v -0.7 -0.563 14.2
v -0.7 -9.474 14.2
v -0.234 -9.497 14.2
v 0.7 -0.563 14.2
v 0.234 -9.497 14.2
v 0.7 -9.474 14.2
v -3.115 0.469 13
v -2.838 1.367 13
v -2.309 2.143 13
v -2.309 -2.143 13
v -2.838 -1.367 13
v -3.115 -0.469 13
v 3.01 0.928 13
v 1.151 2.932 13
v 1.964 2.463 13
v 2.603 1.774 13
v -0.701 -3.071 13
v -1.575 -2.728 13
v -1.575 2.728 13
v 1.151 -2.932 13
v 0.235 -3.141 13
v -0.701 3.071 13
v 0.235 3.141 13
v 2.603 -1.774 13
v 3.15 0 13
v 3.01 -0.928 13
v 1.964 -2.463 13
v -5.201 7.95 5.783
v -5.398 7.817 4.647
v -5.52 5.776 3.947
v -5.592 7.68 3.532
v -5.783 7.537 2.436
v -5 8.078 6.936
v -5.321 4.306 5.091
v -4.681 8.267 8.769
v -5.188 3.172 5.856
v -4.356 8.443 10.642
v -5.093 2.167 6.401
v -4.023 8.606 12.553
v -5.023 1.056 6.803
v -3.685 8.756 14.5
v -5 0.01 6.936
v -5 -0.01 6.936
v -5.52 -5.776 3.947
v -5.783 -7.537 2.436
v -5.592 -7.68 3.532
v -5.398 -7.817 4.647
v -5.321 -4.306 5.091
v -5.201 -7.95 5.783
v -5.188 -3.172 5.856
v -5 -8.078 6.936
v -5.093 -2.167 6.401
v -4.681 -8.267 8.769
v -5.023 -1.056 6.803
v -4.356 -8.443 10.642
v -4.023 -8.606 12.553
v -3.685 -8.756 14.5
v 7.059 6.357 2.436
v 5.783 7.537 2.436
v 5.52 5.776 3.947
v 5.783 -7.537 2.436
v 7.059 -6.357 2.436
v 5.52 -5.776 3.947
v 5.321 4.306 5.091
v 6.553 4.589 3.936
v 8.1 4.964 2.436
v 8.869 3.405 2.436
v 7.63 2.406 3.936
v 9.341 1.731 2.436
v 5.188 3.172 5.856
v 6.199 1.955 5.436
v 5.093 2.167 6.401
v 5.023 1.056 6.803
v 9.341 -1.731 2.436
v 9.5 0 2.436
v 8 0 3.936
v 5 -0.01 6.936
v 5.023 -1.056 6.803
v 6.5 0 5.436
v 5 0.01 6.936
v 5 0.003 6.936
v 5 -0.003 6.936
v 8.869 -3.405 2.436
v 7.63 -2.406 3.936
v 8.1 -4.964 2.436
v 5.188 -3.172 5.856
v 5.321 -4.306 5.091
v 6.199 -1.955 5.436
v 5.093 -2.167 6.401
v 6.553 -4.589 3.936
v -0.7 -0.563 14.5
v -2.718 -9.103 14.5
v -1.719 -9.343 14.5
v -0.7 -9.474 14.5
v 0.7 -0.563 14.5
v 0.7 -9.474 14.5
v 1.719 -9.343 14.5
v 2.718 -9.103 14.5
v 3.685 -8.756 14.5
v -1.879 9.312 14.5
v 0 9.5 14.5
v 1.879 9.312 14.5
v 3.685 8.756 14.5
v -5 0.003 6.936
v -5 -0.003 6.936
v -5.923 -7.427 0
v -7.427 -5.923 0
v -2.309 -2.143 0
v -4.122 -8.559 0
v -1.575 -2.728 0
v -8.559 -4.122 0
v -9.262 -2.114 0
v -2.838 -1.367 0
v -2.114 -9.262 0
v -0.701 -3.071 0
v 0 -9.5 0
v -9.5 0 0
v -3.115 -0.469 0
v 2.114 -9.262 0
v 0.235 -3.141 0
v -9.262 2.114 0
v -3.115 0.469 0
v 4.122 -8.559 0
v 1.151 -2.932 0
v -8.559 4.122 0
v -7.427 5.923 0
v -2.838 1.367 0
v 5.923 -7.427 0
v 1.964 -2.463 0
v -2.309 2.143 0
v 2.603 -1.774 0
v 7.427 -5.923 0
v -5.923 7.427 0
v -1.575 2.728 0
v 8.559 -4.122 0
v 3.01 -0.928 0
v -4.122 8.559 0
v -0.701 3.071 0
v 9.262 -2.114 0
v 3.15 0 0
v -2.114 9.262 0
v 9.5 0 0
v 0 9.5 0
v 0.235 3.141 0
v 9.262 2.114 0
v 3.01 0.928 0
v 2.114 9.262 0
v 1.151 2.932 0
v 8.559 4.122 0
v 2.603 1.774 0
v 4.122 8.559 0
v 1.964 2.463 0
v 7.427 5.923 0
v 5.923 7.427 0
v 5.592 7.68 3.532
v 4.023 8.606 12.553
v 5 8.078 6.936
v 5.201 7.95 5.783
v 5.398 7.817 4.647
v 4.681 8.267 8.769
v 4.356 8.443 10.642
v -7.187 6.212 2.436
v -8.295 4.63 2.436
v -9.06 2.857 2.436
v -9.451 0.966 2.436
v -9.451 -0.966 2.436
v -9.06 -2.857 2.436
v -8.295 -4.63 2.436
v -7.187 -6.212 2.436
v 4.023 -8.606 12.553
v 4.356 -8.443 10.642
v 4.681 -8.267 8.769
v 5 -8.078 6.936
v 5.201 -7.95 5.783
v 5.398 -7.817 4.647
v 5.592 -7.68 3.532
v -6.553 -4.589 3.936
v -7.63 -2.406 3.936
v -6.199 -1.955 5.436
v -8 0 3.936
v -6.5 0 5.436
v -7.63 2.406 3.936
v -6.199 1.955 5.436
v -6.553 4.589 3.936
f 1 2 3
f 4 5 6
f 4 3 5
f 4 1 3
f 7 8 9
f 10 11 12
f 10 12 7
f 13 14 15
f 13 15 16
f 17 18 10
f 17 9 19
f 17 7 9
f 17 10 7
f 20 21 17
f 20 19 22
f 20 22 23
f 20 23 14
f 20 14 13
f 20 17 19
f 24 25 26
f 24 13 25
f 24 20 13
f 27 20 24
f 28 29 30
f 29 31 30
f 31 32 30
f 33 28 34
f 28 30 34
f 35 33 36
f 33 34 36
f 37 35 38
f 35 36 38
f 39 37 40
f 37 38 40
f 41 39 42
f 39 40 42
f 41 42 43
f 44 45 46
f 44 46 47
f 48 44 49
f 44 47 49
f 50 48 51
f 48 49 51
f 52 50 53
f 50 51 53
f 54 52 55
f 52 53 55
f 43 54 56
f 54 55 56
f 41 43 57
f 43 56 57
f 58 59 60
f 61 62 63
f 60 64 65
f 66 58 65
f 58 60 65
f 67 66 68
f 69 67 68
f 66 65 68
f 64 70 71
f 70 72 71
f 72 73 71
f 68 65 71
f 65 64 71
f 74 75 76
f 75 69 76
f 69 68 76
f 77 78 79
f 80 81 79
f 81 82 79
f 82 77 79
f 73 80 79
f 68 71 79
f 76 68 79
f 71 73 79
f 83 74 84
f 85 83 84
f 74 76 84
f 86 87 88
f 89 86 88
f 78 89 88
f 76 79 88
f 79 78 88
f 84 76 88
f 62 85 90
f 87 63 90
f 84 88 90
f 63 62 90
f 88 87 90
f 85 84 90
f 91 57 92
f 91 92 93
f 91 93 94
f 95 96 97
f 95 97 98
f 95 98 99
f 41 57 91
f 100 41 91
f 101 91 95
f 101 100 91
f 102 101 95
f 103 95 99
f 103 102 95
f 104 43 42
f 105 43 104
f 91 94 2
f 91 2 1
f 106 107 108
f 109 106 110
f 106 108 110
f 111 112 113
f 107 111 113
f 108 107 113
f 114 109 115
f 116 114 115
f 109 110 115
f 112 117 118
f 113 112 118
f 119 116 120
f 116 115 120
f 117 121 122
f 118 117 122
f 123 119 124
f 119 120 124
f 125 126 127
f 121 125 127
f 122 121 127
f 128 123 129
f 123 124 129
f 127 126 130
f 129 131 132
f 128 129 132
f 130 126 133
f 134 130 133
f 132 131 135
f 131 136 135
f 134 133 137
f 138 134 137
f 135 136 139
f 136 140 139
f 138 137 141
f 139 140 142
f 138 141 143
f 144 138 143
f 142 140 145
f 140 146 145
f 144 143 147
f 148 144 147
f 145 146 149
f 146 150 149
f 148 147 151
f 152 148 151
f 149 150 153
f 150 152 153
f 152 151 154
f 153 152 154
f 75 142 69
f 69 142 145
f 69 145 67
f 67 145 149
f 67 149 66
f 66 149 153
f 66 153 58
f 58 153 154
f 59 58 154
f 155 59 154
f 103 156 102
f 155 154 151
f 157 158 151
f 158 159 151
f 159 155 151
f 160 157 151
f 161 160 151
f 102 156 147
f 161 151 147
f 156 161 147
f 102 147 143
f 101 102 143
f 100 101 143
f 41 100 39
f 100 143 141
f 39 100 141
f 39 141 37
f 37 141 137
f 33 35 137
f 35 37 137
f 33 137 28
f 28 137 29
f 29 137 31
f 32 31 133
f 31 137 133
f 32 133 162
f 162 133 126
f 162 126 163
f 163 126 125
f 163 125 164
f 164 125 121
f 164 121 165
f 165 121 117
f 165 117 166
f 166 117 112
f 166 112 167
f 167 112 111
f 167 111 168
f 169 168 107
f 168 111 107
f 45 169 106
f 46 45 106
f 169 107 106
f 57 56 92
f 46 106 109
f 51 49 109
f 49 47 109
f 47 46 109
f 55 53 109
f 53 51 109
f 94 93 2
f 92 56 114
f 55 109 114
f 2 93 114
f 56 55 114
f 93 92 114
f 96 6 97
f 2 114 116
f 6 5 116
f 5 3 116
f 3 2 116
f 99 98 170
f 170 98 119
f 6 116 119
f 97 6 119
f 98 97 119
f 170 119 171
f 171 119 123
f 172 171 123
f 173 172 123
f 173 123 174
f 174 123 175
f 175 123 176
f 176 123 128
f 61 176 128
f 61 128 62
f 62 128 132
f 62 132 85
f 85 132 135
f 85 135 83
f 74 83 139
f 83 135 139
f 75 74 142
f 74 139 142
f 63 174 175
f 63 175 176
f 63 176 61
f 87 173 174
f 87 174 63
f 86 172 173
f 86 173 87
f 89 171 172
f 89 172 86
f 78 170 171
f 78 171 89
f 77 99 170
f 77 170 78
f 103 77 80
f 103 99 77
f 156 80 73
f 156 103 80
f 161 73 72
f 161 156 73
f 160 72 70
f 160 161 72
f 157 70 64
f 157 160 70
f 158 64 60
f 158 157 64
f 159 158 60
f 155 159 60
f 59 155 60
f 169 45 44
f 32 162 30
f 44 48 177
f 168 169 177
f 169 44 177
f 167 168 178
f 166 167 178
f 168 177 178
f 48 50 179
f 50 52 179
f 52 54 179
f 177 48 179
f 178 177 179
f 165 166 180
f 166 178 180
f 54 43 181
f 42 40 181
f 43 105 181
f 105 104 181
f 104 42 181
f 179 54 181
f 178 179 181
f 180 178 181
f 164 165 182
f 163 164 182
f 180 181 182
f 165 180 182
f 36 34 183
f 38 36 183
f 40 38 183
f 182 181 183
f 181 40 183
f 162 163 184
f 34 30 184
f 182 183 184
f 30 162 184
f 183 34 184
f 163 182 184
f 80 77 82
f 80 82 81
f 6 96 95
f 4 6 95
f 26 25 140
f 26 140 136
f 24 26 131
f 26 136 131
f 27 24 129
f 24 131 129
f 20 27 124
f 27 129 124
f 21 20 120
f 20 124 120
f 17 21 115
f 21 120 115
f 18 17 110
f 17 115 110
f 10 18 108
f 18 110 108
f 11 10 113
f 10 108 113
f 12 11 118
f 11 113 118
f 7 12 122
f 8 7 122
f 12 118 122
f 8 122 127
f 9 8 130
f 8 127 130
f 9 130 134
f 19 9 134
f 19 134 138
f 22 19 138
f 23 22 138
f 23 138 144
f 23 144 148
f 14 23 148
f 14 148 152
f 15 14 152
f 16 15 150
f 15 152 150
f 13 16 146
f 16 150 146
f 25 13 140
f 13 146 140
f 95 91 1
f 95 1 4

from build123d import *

# Parameters (mm, degrees)
F0_R     = 9.5
F1_DEPTH = 14.5
F2_R     = 3.15
F3_DEPTH = 13
F5_DEPTH = 12.5
F6_SIZE  = 4.49999
F7_W     = 1.4
F7_H     = 9.2790693743
F8_DEPTH = 0.3


# Not quite as in the source:
# - a fillet or chamfer is up to 0.001 mm smaller than in the source, because OpenCascade refuses the exact size


with BuildPart() as f1:
    # F0 (on Top) → F1 (new body)
    with BuildSketch(Plane.XY):
        Circle(F0_R)
    extrude(amount=F1_DEPTH)

    # F2 (on face) → F3 (cut)
    with BuildSketch(Plane(origin=(0, 0, 0), x_dir=(1, 0, 0), z_dir=(0, 0, -1))):
        Circle(F2_R)
    extrude(amount=-F3_DEPTH, mode=Mode.SUBTRACT)

    # F4 (on Front) → F5 (cut, symmetric)
    with BuildSketch(Plane.XZ):
        Polygon((5.0005883317, 16.3299063618), (3.68460026, 14.5), (5, 6.9363636364), (9.7186830602, 6.9363636364), (12.480460446, 14.9852110131), align=None)
        Polygon((-5, 6.9363636364), (-3.68460026, 14.5), (-5.0005883317, 16.3299063618), (-12.480460446, 14.9852110131), (-9.7186830602, 6.9363636364), align=None)
    extrude(amount=F5_DEPTH, both=True, mode=Mode.SUBTRACT)

    # F6 (size 4.5 in the source; OpenCascade refuses exactly that, so slightly less here)
    f6_edges = [f1.edges().sort_by_distance(p)[0] for p in [
        (8.299096, -4.623311, 6.936364),
        (8.299096, 4.623311, 6.936364),
        (-9.5, 0, 6.936364),
    ]]
    chamfer(f6_edges, length=F6_SIZE)

    # F7 (on face) → F8 (cut)
    with BuildSketch(Plane.XY.offset(14.5)):
        with Locations((0, -5.2029067301)):
            Rectangle(F7_W, F7_H)
    extrude(amount=-F8_DEPTH, mode=Mode.SUBTRACT)


solid = f1.part
